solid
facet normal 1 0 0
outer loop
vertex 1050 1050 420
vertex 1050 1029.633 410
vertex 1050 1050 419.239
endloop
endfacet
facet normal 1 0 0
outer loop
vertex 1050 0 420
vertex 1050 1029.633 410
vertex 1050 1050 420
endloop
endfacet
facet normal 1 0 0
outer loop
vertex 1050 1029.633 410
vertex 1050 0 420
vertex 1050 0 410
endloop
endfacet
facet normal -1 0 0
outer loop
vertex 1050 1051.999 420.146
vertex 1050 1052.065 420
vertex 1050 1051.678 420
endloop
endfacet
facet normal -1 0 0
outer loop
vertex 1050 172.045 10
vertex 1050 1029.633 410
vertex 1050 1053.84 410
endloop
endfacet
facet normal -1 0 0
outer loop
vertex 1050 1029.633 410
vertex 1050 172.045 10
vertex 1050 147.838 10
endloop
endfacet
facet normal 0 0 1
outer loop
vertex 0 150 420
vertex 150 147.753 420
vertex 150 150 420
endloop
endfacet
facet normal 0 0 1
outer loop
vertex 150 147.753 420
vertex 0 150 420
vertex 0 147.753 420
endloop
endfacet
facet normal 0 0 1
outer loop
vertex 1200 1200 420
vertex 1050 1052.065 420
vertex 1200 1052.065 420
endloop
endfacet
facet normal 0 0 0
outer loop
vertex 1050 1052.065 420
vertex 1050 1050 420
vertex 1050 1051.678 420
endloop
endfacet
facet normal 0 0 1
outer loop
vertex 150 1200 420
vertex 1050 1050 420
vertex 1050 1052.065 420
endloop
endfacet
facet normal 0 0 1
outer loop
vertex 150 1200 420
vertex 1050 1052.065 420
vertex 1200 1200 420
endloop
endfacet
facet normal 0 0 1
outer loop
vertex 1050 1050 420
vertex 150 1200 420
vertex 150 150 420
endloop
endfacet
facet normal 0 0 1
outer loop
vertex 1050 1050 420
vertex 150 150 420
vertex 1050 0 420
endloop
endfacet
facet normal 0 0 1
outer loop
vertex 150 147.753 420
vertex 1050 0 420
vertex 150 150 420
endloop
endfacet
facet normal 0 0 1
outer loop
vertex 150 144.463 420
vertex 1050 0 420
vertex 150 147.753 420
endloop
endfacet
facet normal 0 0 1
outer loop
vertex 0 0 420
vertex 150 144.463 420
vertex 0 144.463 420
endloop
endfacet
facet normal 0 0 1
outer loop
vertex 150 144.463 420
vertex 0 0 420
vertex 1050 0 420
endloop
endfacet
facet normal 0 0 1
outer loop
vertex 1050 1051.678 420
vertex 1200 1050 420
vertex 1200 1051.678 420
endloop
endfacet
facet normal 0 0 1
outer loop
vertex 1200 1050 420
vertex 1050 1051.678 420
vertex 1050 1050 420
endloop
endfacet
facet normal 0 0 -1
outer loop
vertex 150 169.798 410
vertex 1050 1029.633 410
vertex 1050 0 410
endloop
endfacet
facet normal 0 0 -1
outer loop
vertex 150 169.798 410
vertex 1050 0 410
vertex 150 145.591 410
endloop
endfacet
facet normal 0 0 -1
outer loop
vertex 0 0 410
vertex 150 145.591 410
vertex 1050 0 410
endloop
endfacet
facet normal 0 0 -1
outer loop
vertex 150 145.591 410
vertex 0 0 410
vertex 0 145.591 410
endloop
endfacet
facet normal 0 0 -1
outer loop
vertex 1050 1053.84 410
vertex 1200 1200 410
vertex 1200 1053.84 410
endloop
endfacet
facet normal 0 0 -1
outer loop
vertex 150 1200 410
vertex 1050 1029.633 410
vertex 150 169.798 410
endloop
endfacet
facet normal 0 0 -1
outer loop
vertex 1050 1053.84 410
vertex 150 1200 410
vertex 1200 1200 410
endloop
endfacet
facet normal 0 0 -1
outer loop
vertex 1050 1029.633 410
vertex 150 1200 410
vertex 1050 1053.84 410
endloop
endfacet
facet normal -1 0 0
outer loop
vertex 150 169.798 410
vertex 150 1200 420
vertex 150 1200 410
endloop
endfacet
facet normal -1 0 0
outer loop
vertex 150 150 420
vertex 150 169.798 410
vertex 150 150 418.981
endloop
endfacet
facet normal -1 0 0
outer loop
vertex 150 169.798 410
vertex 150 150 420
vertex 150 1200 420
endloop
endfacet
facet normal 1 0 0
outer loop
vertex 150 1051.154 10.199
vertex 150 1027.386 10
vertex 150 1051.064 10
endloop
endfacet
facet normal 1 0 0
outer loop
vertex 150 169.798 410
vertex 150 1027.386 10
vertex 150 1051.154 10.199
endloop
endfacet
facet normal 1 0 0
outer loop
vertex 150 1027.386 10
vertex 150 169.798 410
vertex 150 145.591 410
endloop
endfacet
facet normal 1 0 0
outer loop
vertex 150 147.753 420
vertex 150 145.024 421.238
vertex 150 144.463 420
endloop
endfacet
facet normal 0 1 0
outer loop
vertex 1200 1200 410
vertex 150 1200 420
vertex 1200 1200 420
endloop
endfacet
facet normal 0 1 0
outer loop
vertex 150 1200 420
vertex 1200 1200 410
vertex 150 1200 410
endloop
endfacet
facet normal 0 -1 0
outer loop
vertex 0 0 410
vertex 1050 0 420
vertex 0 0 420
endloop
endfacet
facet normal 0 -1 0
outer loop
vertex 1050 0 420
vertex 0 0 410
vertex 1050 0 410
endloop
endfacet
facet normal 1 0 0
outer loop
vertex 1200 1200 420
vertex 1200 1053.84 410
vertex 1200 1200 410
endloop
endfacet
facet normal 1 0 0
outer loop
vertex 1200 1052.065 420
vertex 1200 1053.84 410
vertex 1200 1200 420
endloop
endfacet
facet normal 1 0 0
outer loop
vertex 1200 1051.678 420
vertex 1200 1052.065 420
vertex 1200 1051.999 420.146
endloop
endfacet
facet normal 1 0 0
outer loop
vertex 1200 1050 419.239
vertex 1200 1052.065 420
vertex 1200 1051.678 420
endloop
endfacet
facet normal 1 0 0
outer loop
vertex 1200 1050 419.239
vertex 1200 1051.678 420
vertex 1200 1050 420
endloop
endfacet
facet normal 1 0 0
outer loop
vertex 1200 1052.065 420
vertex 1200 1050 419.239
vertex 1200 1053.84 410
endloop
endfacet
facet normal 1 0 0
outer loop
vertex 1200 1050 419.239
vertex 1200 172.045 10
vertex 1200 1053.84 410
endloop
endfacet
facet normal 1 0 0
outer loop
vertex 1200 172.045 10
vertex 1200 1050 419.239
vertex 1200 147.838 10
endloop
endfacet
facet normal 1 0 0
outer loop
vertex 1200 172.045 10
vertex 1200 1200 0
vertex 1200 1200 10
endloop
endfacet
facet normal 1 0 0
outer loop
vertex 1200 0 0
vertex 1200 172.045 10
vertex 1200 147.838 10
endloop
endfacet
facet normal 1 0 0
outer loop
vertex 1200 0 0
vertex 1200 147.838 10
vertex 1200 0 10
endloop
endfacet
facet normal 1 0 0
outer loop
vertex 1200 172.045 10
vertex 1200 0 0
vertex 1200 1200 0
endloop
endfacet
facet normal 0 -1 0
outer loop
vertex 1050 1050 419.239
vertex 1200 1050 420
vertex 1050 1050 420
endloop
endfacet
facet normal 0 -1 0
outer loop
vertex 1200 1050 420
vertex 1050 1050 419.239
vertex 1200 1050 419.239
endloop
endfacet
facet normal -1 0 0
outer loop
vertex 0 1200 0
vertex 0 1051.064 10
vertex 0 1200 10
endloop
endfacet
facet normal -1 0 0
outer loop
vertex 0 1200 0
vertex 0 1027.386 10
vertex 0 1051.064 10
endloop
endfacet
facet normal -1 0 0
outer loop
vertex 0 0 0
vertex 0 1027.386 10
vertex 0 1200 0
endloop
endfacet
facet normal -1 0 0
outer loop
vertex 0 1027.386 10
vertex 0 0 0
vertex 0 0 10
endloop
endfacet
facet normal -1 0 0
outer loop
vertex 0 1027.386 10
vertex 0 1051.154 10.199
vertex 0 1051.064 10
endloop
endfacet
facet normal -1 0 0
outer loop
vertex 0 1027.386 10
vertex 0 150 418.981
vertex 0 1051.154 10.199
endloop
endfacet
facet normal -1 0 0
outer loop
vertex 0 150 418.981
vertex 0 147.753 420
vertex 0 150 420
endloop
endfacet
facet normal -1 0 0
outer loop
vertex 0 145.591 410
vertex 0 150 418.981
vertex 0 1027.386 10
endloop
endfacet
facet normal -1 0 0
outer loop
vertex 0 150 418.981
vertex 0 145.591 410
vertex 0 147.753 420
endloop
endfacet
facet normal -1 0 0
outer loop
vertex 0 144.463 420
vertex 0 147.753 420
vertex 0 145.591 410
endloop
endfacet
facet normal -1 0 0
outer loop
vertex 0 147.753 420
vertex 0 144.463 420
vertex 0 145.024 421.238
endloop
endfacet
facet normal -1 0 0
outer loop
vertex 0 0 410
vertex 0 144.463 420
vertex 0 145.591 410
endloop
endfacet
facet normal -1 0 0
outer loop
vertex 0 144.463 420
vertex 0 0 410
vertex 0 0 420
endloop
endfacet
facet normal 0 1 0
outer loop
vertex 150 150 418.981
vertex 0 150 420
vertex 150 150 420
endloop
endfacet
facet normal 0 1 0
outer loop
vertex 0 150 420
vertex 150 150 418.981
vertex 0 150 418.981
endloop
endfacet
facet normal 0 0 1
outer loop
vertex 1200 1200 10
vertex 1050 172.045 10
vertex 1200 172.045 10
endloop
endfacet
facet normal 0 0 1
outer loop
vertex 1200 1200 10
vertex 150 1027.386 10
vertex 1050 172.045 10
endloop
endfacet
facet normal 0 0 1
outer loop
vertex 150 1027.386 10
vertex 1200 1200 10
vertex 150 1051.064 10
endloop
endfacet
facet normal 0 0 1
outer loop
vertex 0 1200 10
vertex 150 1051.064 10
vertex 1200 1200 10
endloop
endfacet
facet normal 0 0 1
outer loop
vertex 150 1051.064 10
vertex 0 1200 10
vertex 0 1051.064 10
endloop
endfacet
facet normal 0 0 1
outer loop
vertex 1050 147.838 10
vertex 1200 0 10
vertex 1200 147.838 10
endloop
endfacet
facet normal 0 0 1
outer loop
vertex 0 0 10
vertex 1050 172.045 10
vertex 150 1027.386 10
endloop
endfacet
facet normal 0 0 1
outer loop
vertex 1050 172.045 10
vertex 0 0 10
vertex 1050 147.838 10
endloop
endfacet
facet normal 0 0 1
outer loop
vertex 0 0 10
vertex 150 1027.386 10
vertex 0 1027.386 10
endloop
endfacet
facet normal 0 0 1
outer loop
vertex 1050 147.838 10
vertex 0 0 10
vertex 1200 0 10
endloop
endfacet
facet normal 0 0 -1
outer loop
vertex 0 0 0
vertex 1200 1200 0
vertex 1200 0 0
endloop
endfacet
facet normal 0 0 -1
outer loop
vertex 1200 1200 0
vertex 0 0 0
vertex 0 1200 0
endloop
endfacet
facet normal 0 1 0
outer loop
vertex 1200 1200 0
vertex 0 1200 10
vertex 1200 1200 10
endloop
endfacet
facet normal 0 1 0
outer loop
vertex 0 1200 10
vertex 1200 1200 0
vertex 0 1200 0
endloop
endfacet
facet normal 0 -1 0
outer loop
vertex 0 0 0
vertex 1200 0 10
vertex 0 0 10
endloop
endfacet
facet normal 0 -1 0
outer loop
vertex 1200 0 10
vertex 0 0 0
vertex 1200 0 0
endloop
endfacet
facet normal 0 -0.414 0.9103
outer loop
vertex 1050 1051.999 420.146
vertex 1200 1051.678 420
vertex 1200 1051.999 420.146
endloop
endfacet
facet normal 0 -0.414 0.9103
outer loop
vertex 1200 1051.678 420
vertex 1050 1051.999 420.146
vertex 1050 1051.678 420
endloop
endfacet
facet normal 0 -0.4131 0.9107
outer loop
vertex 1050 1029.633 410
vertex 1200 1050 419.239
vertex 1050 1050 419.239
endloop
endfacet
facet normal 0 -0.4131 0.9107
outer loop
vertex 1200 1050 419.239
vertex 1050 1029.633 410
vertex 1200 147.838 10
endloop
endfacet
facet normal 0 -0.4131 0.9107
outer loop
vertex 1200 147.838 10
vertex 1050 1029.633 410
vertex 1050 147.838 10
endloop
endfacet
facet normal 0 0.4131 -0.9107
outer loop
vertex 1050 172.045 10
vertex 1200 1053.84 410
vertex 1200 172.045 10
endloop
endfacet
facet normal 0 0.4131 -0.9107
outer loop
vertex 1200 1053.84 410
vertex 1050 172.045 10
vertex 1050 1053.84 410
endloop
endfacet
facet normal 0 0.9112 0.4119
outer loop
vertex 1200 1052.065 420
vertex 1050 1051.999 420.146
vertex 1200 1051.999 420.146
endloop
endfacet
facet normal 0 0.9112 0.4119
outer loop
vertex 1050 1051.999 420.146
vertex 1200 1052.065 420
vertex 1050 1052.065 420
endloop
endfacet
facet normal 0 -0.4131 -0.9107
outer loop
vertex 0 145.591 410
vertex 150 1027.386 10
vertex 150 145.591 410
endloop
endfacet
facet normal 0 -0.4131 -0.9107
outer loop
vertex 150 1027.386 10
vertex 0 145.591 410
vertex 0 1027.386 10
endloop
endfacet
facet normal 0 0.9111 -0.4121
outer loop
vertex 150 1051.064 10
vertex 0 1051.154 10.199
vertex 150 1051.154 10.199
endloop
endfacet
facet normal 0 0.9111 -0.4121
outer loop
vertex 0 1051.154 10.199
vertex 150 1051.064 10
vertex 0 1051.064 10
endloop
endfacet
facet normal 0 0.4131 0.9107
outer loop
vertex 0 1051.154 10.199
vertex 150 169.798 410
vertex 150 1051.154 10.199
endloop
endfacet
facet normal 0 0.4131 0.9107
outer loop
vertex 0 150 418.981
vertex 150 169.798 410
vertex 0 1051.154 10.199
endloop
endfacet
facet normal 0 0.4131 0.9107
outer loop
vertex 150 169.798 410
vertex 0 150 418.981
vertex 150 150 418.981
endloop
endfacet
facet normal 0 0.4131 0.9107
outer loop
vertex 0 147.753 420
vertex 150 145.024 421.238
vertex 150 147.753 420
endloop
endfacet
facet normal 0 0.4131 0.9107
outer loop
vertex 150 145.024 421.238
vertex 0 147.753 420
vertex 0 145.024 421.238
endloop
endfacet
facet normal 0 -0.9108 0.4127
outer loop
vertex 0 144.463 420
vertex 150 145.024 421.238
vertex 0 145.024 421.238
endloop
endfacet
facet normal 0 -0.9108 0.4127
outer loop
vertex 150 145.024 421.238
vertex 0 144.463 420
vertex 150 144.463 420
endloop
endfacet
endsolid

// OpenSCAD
// file: tile.scad
module tile()
{
    cube([150,150,2]);
    for(x=[20,130])
        for(y=[20,130])
            translate([x,y,-5]) cylinder(h=5,r=5, $fn=200);
}

tile();
// main file
use <tile.scad>

$fn=200;

module table()
{
    difference()
    {
        cube([1200,1200,10]);
        *for(x=[150:150:1200-2*150])
            for(y=[0:150:1200-150])
                for(xt=[20,130])
                    for(yt=[20,130])
                        translate([x+xt,y+yt,-1]) cylinder(r=5,h=12);
    }
    translate([150,0,400+10])
    union()
    {
        difference()
        {
            cube([1200-2*150,1200,10]);
            *for(x=[0:150:1200-2*150])
                for(y=[0:150:1200-150])
                    for(xt=[20,130])
                        for(yt=[20,130])
                            translate([x+xt,y+yt,-1]) cylinder(r=5,h=12);
        }
        translate([1200-2*150,1200-150,0])
        cube([150,150,10]);
        translate([-150,0,0])
        cube([150,150,10]);
    }
    translate([1200-150,150,0])
    rotate([24.4,0,0])
    cube([150,7*150-55,10]);
    translate([0,150,408])
    rotate([-24.4,0,0])
    translate([0,-10,0])
    cube([150,7*150-55,10]);
}
color("saddlebrown")
table();
